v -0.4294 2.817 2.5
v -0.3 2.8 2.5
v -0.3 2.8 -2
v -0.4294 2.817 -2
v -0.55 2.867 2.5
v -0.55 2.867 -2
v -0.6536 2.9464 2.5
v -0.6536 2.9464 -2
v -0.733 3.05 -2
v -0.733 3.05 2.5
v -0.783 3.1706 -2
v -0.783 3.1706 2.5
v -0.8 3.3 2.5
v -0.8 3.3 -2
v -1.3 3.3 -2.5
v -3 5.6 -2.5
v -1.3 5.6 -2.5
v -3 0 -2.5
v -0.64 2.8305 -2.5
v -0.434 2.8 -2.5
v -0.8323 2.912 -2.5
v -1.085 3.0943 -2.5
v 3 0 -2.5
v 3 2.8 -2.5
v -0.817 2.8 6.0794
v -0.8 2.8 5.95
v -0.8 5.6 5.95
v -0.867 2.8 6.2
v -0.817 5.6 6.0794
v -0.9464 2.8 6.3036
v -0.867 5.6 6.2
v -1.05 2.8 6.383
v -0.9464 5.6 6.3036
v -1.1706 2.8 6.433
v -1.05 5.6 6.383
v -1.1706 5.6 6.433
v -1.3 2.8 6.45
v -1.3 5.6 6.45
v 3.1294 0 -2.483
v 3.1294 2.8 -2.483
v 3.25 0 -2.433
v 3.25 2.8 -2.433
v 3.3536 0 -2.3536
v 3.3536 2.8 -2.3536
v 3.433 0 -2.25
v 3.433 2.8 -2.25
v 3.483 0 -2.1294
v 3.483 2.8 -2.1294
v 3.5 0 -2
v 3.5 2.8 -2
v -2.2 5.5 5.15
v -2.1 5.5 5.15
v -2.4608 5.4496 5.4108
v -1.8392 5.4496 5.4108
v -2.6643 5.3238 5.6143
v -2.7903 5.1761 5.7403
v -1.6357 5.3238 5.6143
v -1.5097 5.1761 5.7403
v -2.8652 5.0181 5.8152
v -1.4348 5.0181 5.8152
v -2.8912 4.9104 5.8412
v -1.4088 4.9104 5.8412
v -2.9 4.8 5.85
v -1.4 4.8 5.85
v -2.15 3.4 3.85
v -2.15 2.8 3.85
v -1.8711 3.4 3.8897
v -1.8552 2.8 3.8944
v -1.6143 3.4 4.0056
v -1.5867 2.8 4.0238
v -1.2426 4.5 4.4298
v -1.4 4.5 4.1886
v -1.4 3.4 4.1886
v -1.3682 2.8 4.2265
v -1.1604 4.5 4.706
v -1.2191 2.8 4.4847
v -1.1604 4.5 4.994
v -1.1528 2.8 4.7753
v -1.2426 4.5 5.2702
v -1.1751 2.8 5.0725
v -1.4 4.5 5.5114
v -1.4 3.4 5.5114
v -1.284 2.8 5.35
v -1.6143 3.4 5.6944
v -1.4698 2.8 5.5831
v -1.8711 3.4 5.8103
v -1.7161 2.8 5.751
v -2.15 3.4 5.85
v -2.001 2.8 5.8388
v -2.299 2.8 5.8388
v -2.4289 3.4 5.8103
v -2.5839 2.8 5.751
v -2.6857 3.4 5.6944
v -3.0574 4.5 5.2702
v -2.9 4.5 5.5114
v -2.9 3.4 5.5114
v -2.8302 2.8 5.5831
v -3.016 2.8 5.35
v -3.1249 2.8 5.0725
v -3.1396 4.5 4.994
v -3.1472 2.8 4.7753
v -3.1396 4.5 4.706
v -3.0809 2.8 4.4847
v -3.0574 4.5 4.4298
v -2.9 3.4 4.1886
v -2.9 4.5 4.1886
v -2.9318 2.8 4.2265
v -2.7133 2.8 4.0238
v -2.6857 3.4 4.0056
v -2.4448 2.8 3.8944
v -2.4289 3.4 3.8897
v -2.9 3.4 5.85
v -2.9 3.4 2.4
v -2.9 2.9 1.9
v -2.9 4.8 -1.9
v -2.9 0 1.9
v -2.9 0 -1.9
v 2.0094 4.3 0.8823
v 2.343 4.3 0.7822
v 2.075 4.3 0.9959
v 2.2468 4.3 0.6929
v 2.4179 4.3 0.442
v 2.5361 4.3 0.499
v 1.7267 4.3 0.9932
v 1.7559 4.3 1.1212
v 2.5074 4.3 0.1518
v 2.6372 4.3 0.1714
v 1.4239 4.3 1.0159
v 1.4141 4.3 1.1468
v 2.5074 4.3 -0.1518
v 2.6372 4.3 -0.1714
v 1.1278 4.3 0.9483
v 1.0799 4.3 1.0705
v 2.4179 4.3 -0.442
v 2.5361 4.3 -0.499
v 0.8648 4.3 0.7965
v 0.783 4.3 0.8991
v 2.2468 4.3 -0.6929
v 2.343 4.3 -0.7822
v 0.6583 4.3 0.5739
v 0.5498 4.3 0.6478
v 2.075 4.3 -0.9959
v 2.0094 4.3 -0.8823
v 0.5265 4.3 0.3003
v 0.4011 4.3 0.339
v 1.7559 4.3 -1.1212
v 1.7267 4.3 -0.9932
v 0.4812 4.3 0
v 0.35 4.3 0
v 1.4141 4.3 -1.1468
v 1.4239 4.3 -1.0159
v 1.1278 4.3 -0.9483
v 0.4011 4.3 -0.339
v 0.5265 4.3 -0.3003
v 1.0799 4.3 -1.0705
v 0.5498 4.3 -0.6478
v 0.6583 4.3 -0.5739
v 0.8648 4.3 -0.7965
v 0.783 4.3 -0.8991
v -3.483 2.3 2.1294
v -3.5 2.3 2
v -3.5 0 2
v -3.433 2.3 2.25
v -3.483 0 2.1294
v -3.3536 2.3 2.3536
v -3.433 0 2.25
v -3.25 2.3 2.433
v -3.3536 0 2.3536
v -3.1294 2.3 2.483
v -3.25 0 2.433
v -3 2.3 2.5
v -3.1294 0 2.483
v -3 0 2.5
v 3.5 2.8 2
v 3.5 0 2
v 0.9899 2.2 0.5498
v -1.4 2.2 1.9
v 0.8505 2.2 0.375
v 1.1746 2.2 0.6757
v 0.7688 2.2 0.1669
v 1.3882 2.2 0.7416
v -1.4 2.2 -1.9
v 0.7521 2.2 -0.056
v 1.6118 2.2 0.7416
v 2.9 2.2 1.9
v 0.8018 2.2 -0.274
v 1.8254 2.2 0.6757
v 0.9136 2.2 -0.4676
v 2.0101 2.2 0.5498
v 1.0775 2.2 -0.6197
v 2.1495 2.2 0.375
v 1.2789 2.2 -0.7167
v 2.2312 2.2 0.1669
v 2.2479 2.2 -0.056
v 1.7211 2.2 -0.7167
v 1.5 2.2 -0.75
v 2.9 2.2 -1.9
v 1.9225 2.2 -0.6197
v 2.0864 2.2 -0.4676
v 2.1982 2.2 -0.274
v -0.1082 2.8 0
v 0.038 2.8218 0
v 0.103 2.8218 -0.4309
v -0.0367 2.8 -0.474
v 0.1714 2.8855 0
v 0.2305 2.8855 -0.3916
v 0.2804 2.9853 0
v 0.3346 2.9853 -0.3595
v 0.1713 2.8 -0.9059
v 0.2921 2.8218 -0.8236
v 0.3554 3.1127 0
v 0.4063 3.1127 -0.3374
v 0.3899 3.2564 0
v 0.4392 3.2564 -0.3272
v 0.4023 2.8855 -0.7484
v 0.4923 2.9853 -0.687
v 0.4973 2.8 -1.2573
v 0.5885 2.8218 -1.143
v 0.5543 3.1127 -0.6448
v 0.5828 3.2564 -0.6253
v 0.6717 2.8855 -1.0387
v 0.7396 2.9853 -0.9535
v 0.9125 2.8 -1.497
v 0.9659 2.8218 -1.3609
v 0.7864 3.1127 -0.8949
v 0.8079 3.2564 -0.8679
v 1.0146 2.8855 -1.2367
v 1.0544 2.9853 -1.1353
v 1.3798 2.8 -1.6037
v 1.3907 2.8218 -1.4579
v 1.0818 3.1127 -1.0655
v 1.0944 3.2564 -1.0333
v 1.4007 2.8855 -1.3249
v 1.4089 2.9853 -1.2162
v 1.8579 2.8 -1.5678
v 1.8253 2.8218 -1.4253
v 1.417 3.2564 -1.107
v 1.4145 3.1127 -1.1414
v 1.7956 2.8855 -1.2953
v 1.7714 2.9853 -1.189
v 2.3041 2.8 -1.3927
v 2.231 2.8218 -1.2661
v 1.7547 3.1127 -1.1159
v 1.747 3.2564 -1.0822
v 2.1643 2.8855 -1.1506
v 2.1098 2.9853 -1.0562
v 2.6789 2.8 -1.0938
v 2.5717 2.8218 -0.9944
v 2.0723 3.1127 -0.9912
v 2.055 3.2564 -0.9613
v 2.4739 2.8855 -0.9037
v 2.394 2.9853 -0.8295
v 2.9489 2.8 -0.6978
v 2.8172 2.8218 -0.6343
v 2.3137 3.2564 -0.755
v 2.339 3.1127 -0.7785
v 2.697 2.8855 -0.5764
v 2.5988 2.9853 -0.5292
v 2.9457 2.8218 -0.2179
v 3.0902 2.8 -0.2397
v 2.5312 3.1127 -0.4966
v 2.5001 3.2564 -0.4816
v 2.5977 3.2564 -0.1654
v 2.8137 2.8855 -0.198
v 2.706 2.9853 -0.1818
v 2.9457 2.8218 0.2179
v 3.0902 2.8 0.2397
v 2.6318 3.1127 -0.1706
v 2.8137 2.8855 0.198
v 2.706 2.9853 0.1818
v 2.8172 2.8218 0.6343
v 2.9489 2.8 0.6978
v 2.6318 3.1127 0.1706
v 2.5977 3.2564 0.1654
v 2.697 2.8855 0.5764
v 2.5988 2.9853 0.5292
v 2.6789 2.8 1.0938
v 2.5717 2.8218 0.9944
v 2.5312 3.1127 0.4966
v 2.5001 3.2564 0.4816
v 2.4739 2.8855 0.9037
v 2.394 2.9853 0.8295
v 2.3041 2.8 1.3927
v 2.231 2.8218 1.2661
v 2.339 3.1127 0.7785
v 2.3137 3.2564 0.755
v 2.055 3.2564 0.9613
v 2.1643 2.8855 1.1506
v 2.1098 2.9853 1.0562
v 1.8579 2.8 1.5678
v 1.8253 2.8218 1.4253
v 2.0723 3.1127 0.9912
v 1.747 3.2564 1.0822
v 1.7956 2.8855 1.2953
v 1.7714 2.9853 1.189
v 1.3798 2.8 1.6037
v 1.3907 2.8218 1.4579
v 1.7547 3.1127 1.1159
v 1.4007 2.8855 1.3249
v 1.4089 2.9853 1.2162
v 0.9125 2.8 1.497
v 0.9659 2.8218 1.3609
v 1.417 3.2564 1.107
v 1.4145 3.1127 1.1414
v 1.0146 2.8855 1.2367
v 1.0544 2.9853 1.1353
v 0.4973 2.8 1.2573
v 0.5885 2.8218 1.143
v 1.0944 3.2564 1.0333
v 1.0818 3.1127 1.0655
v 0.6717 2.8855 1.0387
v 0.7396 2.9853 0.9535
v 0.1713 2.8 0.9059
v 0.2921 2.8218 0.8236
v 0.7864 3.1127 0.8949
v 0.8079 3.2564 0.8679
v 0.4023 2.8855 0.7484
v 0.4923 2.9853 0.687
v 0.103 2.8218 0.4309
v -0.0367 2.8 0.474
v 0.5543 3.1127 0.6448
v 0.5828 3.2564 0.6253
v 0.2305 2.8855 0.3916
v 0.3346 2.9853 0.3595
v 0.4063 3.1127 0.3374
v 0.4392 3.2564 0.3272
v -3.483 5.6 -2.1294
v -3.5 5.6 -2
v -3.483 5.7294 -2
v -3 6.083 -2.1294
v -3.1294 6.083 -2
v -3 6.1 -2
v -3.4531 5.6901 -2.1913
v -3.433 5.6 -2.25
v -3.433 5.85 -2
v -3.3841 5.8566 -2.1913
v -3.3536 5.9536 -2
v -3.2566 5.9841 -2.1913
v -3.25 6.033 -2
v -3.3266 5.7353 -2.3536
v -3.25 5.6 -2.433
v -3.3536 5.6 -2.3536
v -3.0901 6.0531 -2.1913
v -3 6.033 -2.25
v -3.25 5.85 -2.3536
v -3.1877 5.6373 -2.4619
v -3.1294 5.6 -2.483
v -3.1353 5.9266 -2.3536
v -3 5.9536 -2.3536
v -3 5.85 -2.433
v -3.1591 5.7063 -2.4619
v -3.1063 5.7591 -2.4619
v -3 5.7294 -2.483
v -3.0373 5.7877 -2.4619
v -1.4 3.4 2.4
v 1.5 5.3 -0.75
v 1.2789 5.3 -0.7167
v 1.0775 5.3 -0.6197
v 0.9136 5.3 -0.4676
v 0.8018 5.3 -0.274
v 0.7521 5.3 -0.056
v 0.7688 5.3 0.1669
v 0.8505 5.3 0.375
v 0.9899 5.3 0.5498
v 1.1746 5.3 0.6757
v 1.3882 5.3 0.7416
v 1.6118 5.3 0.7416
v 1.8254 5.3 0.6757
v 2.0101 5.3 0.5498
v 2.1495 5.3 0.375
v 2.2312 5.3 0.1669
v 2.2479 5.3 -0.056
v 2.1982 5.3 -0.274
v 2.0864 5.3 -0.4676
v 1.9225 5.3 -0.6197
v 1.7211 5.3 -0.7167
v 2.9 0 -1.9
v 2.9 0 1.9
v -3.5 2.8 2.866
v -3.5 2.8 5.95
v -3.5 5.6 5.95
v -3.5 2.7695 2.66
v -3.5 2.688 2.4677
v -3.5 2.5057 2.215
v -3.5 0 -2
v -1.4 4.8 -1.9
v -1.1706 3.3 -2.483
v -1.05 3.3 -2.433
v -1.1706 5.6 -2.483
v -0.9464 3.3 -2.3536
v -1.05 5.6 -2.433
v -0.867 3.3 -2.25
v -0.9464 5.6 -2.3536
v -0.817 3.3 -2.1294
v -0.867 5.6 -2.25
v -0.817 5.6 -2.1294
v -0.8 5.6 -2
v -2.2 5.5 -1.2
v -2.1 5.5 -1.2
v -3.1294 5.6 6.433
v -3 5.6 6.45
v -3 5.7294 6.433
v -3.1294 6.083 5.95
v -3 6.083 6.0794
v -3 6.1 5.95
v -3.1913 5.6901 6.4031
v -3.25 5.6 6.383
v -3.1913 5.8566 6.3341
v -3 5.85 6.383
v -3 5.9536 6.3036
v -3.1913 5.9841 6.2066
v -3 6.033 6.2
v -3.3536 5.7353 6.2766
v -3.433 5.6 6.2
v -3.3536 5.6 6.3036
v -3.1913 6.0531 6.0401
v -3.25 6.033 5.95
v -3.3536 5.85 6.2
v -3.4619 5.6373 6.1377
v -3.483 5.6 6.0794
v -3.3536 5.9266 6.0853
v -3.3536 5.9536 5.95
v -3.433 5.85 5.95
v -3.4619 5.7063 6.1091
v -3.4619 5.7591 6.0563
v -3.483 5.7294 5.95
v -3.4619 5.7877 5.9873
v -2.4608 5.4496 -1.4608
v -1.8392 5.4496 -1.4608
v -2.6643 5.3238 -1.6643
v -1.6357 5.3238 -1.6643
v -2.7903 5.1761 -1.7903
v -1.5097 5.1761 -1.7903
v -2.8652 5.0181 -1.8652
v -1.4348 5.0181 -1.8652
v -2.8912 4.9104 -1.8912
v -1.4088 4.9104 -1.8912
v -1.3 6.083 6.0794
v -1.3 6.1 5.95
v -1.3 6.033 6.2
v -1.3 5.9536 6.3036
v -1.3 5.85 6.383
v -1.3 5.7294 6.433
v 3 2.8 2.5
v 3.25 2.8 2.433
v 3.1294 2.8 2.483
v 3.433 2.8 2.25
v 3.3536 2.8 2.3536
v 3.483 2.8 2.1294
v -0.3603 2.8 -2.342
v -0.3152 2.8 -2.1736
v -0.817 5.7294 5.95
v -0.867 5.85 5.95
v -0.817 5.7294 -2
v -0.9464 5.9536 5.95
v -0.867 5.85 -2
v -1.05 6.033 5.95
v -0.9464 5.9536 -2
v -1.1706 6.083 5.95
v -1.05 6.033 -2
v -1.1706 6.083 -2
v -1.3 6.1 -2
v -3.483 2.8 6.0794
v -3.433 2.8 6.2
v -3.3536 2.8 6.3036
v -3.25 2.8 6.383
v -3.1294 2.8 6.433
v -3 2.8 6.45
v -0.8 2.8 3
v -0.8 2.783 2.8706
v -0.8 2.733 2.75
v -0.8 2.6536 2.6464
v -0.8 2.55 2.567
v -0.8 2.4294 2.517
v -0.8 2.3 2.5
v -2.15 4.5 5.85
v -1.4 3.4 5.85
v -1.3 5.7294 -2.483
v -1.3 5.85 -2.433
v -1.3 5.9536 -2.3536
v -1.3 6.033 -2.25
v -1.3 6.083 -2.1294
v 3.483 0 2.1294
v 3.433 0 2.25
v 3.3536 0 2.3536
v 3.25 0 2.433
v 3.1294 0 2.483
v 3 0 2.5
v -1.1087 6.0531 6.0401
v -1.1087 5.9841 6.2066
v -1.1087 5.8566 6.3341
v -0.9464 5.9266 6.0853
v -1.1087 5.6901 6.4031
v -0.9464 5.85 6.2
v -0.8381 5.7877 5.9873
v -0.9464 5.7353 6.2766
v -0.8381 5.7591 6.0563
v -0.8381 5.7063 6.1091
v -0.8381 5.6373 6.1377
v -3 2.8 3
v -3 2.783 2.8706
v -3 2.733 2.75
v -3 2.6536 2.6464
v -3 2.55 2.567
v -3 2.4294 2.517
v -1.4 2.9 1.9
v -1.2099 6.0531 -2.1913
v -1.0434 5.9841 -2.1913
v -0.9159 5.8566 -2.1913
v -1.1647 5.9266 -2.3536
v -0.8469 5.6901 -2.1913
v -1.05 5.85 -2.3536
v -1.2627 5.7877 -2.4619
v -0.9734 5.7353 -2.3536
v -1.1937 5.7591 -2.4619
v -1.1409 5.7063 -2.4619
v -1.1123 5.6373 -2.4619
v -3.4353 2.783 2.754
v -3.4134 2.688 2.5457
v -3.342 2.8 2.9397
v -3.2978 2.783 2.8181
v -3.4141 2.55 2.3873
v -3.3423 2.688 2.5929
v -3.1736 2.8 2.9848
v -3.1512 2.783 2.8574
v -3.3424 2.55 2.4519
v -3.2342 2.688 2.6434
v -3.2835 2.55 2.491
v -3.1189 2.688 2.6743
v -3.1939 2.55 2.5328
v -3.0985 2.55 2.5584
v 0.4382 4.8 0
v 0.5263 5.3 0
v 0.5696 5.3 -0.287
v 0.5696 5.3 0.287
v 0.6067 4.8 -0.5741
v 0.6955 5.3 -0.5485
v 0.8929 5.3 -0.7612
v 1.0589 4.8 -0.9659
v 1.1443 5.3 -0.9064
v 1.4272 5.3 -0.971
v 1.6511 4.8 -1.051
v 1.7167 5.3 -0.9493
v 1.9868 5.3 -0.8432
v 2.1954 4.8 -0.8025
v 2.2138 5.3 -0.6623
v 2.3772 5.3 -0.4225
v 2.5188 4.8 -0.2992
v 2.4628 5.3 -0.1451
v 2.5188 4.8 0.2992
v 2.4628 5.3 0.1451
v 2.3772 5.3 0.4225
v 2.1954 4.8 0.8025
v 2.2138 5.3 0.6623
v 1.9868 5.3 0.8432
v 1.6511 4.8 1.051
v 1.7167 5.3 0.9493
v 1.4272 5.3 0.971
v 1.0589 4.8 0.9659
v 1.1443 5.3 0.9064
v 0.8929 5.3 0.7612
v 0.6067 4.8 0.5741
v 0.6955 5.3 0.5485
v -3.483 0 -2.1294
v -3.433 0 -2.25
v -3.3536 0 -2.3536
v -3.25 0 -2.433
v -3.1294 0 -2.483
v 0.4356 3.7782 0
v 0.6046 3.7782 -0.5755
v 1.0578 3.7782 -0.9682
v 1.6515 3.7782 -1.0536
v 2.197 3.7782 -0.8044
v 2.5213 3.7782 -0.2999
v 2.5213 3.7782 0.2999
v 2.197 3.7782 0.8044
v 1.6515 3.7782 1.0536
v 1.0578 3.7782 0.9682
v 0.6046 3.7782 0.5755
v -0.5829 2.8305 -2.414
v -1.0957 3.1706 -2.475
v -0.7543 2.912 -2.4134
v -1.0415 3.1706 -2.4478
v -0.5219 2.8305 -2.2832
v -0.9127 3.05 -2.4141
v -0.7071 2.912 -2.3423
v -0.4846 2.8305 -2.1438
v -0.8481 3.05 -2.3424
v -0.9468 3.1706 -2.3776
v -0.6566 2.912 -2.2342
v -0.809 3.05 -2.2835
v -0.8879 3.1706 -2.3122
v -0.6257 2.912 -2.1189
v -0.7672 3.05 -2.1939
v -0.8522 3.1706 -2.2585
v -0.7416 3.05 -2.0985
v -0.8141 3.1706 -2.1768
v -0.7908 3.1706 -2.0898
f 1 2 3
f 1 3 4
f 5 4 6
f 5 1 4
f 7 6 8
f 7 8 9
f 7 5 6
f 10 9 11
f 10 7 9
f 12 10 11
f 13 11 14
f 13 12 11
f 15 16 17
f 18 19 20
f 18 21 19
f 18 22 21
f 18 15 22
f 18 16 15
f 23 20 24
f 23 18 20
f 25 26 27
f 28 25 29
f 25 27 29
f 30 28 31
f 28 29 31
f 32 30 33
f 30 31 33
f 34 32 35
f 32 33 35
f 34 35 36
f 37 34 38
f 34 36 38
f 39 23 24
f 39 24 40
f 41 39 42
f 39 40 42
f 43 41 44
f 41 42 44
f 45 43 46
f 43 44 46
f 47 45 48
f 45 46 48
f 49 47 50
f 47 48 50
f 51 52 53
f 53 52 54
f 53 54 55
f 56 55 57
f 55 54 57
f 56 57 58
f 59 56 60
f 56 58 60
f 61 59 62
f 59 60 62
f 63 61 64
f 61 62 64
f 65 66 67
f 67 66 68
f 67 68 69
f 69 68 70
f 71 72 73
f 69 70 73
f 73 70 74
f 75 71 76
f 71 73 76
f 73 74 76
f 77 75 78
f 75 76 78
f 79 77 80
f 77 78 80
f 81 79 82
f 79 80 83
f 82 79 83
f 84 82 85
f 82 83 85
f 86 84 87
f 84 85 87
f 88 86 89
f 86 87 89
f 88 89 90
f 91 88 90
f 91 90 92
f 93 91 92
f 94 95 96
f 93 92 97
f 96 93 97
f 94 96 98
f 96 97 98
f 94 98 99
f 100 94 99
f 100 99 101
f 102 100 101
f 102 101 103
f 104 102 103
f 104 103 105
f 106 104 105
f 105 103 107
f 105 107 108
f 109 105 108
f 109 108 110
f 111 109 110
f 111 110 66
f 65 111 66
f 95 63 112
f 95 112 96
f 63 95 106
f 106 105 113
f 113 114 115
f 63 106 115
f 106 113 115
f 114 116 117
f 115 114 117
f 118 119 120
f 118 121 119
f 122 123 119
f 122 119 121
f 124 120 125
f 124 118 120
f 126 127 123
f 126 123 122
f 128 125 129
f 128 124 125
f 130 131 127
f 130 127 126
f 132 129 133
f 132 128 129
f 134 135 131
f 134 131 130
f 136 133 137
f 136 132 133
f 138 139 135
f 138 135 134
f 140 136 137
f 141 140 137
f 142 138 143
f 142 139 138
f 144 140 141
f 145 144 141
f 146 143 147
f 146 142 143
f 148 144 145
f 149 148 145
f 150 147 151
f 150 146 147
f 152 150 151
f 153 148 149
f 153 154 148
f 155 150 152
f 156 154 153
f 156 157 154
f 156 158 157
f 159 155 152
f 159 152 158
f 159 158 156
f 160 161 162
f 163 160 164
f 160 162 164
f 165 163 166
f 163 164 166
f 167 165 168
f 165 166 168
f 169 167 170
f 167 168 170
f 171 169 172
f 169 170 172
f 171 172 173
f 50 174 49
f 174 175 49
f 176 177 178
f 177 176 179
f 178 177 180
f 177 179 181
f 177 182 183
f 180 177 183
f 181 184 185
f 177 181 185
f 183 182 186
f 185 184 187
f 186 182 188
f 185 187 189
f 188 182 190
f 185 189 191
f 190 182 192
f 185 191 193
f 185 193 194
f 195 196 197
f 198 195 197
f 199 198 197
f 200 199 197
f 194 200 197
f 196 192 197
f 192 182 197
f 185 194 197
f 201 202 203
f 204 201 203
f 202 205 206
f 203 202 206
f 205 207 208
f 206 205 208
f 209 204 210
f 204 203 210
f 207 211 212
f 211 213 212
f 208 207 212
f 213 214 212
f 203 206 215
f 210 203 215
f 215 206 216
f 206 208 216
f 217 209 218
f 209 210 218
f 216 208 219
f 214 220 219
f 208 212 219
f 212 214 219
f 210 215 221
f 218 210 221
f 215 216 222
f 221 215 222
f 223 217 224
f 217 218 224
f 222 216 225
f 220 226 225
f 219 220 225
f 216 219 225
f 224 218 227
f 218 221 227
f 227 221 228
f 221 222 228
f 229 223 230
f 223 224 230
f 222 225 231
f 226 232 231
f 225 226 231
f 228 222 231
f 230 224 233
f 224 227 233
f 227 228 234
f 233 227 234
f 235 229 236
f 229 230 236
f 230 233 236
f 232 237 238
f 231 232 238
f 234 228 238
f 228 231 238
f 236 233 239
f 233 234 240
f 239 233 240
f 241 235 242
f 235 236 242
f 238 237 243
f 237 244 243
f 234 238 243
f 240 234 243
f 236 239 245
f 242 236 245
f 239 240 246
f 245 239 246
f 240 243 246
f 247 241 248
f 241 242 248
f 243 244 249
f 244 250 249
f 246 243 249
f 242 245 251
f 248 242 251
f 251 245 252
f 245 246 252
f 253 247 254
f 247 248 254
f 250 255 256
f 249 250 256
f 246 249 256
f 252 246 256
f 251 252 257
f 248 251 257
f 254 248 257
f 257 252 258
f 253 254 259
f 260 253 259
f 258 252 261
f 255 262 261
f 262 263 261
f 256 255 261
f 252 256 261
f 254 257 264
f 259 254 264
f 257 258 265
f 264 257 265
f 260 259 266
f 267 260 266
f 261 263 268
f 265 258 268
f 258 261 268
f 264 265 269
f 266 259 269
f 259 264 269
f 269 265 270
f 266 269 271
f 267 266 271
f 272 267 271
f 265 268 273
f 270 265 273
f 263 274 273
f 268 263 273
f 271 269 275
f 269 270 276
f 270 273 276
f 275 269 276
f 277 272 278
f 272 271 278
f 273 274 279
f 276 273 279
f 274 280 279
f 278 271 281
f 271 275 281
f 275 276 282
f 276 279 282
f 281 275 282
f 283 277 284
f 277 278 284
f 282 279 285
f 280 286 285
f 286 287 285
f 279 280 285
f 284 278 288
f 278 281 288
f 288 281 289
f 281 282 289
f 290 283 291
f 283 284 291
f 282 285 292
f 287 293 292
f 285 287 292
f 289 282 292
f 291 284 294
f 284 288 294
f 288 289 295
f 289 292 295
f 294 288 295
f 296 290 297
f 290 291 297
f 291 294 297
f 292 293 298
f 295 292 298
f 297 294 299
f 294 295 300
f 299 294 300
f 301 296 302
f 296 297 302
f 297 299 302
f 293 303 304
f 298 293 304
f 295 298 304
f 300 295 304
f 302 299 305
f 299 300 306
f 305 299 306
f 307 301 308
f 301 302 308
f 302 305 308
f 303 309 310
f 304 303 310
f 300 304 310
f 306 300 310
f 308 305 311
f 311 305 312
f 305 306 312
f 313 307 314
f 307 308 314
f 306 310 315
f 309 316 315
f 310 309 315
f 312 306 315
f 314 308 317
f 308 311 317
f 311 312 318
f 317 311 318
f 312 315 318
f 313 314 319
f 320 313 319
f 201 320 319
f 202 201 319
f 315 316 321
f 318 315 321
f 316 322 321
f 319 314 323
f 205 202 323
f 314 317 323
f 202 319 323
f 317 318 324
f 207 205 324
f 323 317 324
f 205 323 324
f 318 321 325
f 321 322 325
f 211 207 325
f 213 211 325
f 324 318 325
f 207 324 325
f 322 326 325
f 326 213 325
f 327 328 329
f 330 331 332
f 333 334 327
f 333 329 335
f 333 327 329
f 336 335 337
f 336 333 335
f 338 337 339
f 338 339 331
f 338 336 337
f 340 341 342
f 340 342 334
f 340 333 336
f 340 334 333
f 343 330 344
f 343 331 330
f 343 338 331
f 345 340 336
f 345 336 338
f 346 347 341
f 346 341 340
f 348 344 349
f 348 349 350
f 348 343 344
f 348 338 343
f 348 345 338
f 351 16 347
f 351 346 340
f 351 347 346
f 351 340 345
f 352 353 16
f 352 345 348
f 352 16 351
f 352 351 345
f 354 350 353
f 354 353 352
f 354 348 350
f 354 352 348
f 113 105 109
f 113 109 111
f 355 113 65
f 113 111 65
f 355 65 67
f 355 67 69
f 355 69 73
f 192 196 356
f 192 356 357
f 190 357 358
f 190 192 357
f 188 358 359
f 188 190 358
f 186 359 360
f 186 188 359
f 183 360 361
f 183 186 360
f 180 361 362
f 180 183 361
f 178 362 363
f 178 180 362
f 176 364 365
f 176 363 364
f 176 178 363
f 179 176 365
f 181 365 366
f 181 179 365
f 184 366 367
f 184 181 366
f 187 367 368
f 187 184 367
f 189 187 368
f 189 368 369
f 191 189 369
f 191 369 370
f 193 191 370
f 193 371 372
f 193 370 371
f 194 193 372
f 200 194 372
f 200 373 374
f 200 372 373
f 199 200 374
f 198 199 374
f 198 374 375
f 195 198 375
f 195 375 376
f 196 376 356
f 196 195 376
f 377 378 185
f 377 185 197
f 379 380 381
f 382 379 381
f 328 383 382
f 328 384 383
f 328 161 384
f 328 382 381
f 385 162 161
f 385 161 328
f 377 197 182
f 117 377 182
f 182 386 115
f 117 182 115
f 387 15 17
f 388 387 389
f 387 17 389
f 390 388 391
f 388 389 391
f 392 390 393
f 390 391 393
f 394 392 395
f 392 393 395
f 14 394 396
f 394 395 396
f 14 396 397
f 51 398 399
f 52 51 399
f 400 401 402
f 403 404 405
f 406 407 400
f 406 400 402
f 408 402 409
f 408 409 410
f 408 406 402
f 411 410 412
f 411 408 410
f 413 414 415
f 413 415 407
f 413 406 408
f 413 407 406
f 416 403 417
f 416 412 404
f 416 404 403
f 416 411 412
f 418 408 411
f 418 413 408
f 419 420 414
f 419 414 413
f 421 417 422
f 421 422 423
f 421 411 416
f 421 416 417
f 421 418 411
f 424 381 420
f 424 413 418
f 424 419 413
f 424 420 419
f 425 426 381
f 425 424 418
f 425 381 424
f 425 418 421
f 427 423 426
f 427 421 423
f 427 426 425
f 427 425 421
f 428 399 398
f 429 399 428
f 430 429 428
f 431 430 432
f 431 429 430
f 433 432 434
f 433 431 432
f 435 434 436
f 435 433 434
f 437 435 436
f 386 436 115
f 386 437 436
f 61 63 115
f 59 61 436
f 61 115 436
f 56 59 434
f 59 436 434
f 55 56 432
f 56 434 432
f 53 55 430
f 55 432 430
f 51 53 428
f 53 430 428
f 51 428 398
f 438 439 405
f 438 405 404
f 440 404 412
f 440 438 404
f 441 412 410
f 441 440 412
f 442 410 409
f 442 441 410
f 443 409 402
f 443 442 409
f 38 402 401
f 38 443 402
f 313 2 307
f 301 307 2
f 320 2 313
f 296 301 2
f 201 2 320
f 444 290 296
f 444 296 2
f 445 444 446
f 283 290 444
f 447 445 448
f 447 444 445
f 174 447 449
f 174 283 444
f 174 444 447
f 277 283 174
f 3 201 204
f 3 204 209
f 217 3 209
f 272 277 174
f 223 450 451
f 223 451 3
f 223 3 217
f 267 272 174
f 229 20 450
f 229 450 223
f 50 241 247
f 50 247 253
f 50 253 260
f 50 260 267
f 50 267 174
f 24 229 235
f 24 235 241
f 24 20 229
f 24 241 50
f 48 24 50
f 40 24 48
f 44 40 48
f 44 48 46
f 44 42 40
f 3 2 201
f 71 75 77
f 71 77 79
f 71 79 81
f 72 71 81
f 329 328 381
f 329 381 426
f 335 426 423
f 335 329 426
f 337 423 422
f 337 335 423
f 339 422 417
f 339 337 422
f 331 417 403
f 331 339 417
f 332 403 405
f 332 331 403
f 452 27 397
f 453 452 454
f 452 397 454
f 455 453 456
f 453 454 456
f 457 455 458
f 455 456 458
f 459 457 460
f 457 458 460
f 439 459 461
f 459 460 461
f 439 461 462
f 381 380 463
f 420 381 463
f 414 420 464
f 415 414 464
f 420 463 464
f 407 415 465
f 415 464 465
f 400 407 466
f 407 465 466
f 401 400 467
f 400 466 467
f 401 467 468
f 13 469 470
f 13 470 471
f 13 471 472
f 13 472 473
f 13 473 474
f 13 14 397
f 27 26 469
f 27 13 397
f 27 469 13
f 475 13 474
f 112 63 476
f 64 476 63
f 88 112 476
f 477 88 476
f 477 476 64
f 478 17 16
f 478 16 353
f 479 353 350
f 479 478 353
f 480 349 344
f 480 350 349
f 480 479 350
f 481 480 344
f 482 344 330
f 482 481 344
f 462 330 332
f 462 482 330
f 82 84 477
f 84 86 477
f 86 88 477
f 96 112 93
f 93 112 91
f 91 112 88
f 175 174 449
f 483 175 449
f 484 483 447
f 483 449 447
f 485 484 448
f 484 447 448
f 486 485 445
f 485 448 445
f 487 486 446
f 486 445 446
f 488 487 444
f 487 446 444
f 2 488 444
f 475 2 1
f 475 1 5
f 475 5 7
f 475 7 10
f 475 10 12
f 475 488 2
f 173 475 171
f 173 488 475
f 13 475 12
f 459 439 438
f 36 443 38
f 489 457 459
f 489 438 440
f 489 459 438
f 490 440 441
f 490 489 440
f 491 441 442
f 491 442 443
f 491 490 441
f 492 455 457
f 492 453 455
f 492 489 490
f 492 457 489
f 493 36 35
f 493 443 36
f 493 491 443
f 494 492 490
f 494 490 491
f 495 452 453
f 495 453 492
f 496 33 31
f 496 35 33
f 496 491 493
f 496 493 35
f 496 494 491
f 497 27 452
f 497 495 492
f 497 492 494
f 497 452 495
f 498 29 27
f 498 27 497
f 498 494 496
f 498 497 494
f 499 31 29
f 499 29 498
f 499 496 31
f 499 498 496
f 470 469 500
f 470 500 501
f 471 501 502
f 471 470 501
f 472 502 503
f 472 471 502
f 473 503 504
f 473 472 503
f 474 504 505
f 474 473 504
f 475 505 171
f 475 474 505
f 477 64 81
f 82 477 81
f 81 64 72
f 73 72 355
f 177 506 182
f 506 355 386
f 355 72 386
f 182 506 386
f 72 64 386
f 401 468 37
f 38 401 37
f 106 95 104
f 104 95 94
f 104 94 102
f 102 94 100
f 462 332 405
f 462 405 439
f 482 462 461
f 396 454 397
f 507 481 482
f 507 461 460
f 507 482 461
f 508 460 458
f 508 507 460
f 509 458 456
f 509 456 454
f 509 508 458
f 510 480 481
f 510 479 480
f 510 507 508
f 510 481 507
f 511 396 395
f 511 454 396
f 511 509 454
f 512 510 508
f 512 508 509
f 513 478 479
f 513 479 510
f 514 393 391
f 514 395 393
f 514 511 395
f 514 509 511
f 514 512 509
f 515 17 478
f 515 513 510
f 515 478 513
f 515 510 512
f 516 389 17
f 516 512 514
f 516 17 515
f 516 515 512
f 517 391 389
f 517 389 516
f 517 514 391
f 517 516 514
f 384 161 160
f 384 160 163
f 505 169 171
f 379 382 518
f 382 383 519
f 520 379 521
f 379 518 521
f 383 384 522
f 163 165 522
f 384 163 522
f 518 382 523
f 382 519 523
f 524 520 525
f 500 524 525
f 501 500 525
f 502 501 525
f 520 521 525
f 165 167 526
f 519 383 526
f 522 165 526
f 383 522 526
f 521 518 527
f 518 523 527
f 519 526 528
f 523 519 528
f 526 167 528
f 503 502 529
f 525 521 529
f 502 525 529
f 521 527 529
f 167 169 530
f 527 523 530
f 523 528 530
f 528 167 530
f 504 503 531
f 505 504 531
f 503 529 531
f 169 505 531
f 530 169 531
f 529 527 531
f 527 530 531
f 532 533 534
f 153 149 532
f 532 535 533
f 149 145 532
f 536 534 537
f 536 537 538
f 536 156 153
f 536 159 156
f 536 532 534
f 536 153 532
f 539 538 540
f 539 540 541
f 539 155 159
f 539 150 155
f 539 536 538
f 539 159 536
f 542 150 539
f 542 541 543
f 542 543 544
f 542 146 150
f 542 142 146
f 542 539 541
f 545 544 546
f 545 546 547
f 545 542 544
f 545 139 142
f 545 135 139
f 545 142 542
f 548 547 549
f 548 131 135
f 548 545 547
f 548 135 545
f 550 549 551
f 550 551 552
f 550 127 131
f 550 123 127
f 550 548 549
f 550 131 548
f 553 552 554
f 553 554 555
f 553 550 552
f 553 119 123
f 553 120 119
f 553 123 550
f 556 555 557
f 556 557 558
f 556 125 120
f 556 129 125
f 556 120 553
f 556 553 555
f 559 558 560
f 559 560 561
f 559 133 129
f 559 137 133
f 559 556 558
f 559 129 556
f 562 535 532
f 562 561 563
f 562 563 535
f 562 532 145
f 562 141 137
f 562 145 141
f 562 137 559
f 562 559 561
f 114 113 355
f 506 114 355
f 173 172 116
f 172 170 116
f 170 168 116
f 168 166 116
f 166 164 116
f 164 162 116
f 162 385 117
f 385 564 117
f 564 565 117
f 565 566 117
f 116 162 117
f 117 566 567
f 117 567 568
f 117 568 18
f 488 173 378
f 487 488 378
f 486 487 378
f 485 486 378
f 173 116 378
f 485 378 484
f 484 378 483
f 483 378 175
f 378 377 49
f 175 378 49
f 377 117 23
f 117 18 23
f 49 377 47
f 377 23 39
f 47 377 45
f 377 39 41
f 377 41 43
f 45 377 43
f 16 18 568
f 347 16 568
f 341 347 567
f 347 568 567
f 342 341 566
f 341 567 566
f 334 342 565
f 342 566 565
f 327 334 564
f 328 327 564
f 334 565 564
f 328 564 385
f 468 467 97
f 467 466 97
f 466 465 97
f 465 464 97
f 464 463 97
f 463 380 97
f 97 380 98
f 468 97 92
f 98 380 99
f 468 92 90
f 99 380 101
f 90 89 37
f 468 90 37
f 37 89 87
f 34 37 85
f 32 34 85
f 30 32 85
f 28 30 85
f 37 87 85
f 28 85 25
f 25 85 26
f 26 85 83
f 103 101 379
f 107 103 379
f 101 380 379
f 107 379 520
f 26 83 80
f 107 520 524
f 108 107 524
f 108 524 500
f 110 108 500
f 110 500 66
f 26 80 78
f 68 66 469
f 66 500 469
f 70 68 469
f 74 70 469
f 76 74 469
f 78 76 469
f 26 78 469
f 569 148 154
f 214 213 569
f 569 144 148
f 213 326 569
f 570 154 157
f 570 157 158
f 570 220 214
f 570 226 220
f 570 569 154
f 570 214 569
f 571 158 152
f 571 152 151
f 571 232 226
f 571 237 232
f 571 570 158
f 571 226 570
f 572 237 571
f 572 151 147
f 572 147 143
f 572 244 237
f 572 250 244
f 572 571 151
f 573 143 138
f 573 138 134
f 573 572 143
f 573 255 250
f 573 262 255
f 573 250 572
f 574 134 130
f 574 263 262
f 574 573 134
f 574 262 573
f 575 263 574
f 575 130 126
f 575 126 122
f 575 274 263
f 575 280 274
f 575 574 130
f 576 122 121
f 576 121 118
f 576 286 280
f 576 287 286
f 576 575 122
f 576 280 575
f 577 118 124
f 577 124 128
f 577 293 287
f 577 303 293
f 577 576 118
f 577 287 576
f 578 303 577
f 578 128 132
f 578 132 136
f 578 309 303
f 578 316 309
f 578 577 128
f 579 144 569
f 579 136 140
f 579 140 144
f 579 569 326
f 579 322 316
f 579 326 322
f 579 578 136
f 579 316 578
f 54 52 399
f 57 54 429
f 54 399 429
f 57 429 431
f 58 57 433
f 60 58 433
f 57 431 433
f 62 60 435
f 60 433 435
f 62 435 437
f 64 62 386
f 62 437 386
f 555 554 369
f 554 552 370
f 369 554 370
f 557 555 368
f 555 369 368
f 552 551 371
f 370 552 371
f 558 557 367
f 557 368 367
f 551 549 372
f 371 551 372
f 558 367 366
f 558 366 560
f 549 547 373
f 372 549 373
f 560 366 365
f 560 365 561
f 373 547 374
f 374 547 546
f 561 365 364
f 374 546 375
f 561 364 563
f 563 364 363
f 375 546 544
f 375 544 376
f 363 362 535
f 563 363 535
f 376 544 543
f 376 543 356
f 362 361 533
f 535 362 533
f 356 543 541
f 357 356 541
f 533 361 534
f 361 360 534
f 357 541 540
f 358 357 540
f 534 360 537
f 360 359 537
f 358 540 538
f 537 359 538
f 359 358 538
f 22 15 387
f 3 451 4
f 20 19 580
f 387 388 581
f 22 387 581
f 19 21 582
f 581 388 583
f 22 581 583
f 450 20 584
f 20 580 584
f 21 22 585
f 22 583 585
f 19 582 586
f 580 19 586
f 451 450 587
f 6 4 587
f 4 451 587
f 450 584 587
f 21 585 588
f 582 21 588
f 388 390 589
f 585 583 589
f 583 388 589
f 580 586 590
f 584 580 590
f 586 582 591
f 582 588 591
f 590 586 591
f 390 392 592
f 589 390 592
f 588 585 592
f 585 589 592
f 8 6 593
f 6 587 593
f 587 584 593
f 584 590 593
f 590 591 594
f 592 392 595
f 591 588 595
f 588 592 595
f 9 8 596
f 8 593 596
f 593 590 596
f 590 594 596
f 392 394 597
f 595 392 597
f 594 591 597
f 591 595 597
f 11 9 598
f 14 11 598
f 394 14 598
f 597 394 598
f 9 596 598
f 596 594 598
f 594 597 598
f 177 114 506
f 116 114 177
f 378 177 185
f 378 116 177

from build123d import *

# Parameters (mm, degrees)
SKETCH1_W               = 7
SKETCH1_H               = 5
SKETCH1_W_2             = 5.8
SKETCH1_H_2             = 3.8
BOSS_EXTRUDE1_DEPTH     = 2.8
SKETCH3_W               = 2.7
SKETCH3_H               = 8.95
SKETCH3_W_2             = 1.5
SKETCH3_H_2             = 7.75
BOSS_EXTRUDE2_DEPTH     = 2.7
SKETCH4_W               = 2.7
SKETCH4_H               = 4.55
BOSS_EXTRUDE3_DEPTH     = 0.6
SKETCH5_W               = 2.7
SKETCH5_H               = 8.95
BOSS_EXTRUDE4_DEPTH     = 0.6
SKETCH6_W               = 4.9
SKETCH6_H               = 5
BOSS_EXTRUDE5_DEPTH     = 0.6
FILLET2_R               = 0.7
SKETCH7_R               = 1
CUT_EXTRUDE1_DEPTH      = 1.7
SKETCH8_R               = 1.15
BOSS_EXTRUDE6_DEPTH     = 1.5
BOSS_EXTRUDE6_DRAFT     = -5
FILLET1_R               = 0.5
BOSS_EXTRUDE7_START     = -1.5
SKETCH8_2_R             = 1.15
BOSS_EXTRUDE7_DEPTH     = 1
BOSS_EXTRUDE7_DRAFT     = -10
CUT_EXTRUDE2_DEPTH      = 10.052209675
CUT_EXTRUDE2_DEPTH_BACK = 10.052209675
SKETCH9_R               = 0.75
FILLET3_R               = 0.5
FILLET5_R               = 0.5
FILLET6_R               = 0.5
FILLET7_R               = 0.5
CHAMFER1_SIZE           = 0.5


with BuildPart() as part:
    # Sketch1 → Boss-Extrude1 (new body)
    with BuildSketch(Plane(origin=(0, 0, 0), x_dir=(1, 0, 0), z_dir=(0, 1, 0))):
        Rectangle(SKETCH1_W, SKETCH1_H)
        Rectangle(SKETCH1_W_2, SKETCH1_H_2, mode=Mode.SUBTRACT)
    extrude(amount=BOSS_EXTRUDE1_DEPTH)

    # Sketch3 → Boss-Extrude2 (add)
    with BuildSketch(Plane(origin=(0, 2.8, 0), x_dir=(1, 0, 0), z_dir=(0, 1, 0))):
        with Locations((-2.15, -1.975)):
            Rectangle(SKETCH3_W, SKETCH3_H)
        with Locations((-2.15, -1.975)):
            Rectangle(SKETCH3_W_2, SKETCH3_H_2, mode=Mode.SUBTRACT)
    extrude(amount=BOSS_EXTRUDE2_DEPTH)

    # Sketch4 → Boss-Extrude3 (add)
    with BuildSketch(Plane.XZ.offset(-2.8)):
        with Locations((-2.15, 4.175)):
            Rectangle(SKETCH4_W, SKETCH4_H)
    extrude(amount=-BOSS_EXTRUDE3_DEPTH)

    # Sketch5 → Boss-Extrude4 (add)
    with BuildSketch(Plane(origin=(0, 5.5, 0), x_dir=(1, 0, 0), z_dir=(0, 1, 0))):
        with Locations((-2.15, -1.975)):
            Rectangle(SKETCH5_W, SKETCH5_H)
    extrude(amount=BOSS_EXTRUDE4_DEPTH)

    # Sketch6 → Boss-Extrude5 (add)
    with BuildSketch(Plane(origin=(0, 2.8, 0), x_dir=(1, 0, 0), z_dir=(0, 1, 0))):
        with Locations((1.05, 0)):
            Rectangle(SKETCH6_W, SKETCH6_H)
    extrude(amount=-BOSS_EXTRUDE5_DEPTH)

    # Fillet2
    fillet2_edges = [part.edges().sort_by_distance(p)[0] for p in [
        (-2.15, 5.5, -1.9),
        (-1.4, 5.5, 1.975),
        (-2.15, 5.5, 5.85),
        (-2.9, 5.5, 1.975),
    ]]
    fillet(fillet2_edges, radius=FILLET2_R)

    # Sketch7 → Cut-Extrude1 (cut)
    with BuildSketch(Plane.XZ.offset(-2.8)):
        with Locations(Location((-2.15, 4.85, 0), (0, 0, 270))):
            Circle(SKETCH7_R)
    extrude(amount=-CUT_EXTRUDE1_DEPTH, mode=Mode.SUBTRACT)


with BuildPart() as boss_extrude6_tool:
    # Sketch8 → Boss-Extrude6 (with draft: the straight prism first)
    with BuildSketch(Plane(origin=(0, 2.8, 0), x_dir=(-1, 0, 0), z_dir=(0, -1, 0))):
        with Locations((-1.5, 0)):
            Circle(SKETCH8_R)
    extrude(amount=-BOSS_EXTRUDE6_DEPTH)
    # Boss-Extrude6: the draft: its side faces are tilted about the plane it starts from
    boss_extrude6_sides = [boss_extrude6_tool.faces().sort_by_distance(p)[0] for p in [
        (2.65, 3.55, 0),
    ]]
    draft(boss_extrude6_sides, Plane(origin=(0, 2.8, 0), x_dir=(-1, 0, 0), z_dir=(0, -1, 0)), BOSS_EXTRUDE6_DRAFT)


with BuildPart() as part_1:
    add(part.part)

    # Boss-Extrude6: add boss_extrude6_tool
    add(boss_extrude6_tool.part)

    # Fillet1
    fillet1_edges = [part_1.edges().sort_by_distance(p)[0] for p in [
        (2.65, 2.8, 0),
    ]]
    fillet(fillet1_edges, radius=FILLET1_R)


with BuildPart() as boss_extrude7_tool:
    # Sketch8<2> → Boss-Extrude7 (with draft: the straight prism first)
    with BuildSketch(Plane(origin=(0, 2.8, 0), x_dir=(-1, 0, 0), z_dir=(0, -1, 0)).offset(BOSS_EXTRUDE7_START)):
        with Locations((-1.5, 0)):
            Circle(SKETCH8_2_R)
    extrude(amount=-BOSS_EXTRUDE7_DEPTH)
    # Boss-Extrude7: the draft: its side faces are tilted about the plane it starts from
    boss_extrude7_sides = [boss_extrude7_tool.faces().sort_by_distance(p)[0] for p in [
        (2.65, 4.8, 0),
    ]]
    draft(boss_extrude7_sides, Plane(origin=(0, 2.8, 0), x_dir=(-1, 0, 0), z_dir=(0, -1, 0)).offset(BOSS_EXTRUDE7_START), BOSS_EXTRUDE7_DRAFT)


with BuildPart() as part_2:
    add(part_1.part)

    # Boss-Extrude7: add boss_extrude7_tool
    add(boss_extrude7_tool.part)

    # Sketch9 → Cut-Extrude2 (cut, two sides: drawn at the far end of the back side and taken through both)
    with BuildSketch(Plane(origin=(0, 5.3, 0), x_dir=(1, 0, 0), z_dir=(0, 1, 0)).offset(-CUT_EXTRUDE2_DEPTH_BACK)):
        with Locations(Location((1.5, 0, 0), (0, 0, 90))):
            Circle(SKETCH9_R)
    extrude(amount=CUT_EXTRUDE2_DEPTH + CUT_EXTRUDE2_DEPTH_BACK, mode=Mode.SUBTRACT)

    # Fillet3
    fillet3_edges = [part_2.edges().sort_by_distance(p)[0] for p in [
        (-3.5, 6.1, 1.975),
        (-2.15, 6.1, 6.45),
        (-0.8, 6.1, 1.975),
        (-2.15, 6.1, -2.5),
    ]]
    fillet(fillet3_edges, radius=FILLET3_R)

    # Fillet5
    # the kernel refuses this fillet: 0.5 mm, written as the material it takes off along each edge
    with BuildSketch(Plane(origin=(-1.3, 5.6, -2), x_dir=(1, 0, 0), z_dir=(0, 0, -1))) as fillet5_piece_1_section:
        Polygon((0, 0), (FILLET5_R, 0), (FILLET5_R, -FILLET5_R), (0, -FILLET5_R), align=None)
    fillet5_piece_1 = extrude(amount=FILLET5_R, mode=Mode.PRIVATE)
    fillet5_piece_1 = fillet5_piece_1 - Plane(origin=(-1.3, 5.6, -2), x_dir=(-0.7071067811865475, -0.7071067811865475, 0), z_dir=(0, 0, -1)) * Sphere(FILLET5_R, mode=Mode.PRIVATE)
    add(fillet5_piece_1, mode=Mode.SUBTRACT)
    with BuildSketch(Plane(origin=(-1.3, 5.6, 5.95), x_dir=(0, 0, 1), z_dir=(1, 0, 0))) as fillet5_piece_2_section:
        Polygon((0, 0), (FILLET5_R, 0), (FILLET5_R, -FILLET5_R), (0, -FILLET5_R), align=None)
    fillet5_piece_2 = extrude(amount=FILLET5_R, mode=Mode.PRIVATE)
    fillet5_piece_2 = fillet5_piece_2 - Plane(origin=(-1.3, 5.6, 5.95), x_dir=(0, -0.7071067811865475, -0.7071067811865475), z_dir=(1, 0, 0)) * Sphere(FILLET5_R, mode=Mode.PRIVATE)
    add(fillet5_piece_2, mode=Mode.SUBTRACT)
    with BuildSketch(Plane(origin=(-3, 5.6, -2), x_dir=(-1, 0, 0), z_dir=(0, 0, -1))) as fillet5_piece_3_section:
        Polygon((0, 0), (FILLET5_R, 0), (FILLET5_R, FILLET5_R), (0, FILLET5_R), align=None)
    fillet5_piece_3 = extrude(amount=FILLET5_R, mode=Mode.PRIVATE)
    fillet5_piece_3 = fillet5_piece_3 - Plane(origin=(-3, 5.6, -2), x_dir=(0.7071067811865475, -0.7071067811865475, 0), z_dir=(0, 0, -1)) * Sphere(FILLET5_R, mode=Mode.PRIVATE)
    add(fillet5_piece_3, mode=Mode.SUBTRACT)
    with BuildSketch(Plane(origin=(-3, 5.6, 5.95), x_dir=(0, 0, 1), z_dir=(-1, 0, 0))) as fillet5_piece_4_section:
        Polygon((0, 0), (FILLET5_R, 0), (FILLET5_R, FILLET5_R), (0, FILLET5_R), align=None)
    fillet5_piece_4 = extrude(amount=FILLET5_R, mode=Mode.PRIVATE)
    fillet5_piece_4 = fillet5_piece_4 - Plane(origin=(-3, 5.6, 5.95), x_dir=(0, -0.7071067811865475, -0.7071067811865475), z_dir=(-1, 0, 0)) * Sphere(FILLET5_R, mode=Mode.PRIVATE)
    add(fillet5_piece_4, mode=Mode.SUBTRACT)
    with BuildSketch(Plane(origin=(-3.5, 1.55, 6.45), x_dir=(0, 0, -1), z_dir=(0, 1, 0)), Plane(origin=(-0.8, 5.6, 6.45), x_dir=(0, 0, -1), z_dir=(0, -1, 0)), Plane(origin=(-3.5, -1.25, 2.5), x_dir=(0, 0, -1), z_dir=(0, 1, 0))) as fillet5_piece_5:
        with BuildLine():
            CenterArc((FILLET5_R, -FILLET5_R), FILLET5_R, 90, 90)
            Line((0, -FILLET5_R), (0, 0))
            Line((0, 0), (FILLET5_R, 0))
        make_face()
    extrude(amount=4.05, mode=Mode.SUBTRACT)
    with BuildSketch(Plane(origin=(-3.5, -1.25, -2.5), x_dir=(1, 0, 0), z_dir=(0, 1, 0))) as fillet5_piece_6:
        with BuildLine():
            CenterArc((FILLET5_R, -FILLET5_R), FILLET5_R, 90, 90)
            Line((0, -FILLET5_R), (0, 0))
            Line((0, 0), (FILLET5_R, 0))
        make_face()
    extrude(amount=6.85, mode=Mode.SUBTRACT)
    with BuildSketch(Plane(origin=(-0.8, 5.6, -2.5), x_dir=(-1, 0, 0), z_dir=(0, -1, 0))) as fillet5_piece_7:
        with BuildLine():
            CenterArc((FILLET5_R, -FILLET5_R), FILLET5_R, 90, 90)
            Line((0, -FILLET5_R), (0, 0))
            Line((0, 0), (FILLET5_R, 0))
        make_face()
    extrude(amount=2.8, mode=Mode.SUBTRACT)
    with BuildSketch(Plane(origin=(3.5, 4.05, -2.5), x_dir=(-1, 0, 0), z_dir=(0, -1, 0)), Plane(origin=(3.5, 4.05, 2.5), x_dir=(0, 0, -1), z_dir=(0, -1, 0))) as fillet5_piece_8:
        with BuildLine():
            CenterArc((FILLET5_R, -FILLET5_R), FILLET5_R, 90, 90)
            Line((0, -FILLET5_R), (0, 0))
            Line((0, 0), (FILLET5_R, 0))
        make_face()
    extrude(amount=5.3, mode=Mode.SUBTRACT)

    # Fillet6
    # the kernel refuses this fillet: 0.5 mm, written as the material it adds along each edge
    with BuildSketch(Plane(origin=(-1.3, 2.8, -2), x_dir=(-0.5976672776328278, 0, 0.8017442392976482), z_dir=(0.8017442392976482, 0, 0.5976672776328278))) as fillet6_piece_1_section:
        with BuildLine():
            CenterArc((0.5 + FILLET6_R, -FILLET6_R), FILLET6_R, 90, 90)
            Line((0.5, -FILLET6_R), (0.5, 0))
            Line((0.5, 0), (0.5 + FILLET6_R, 0))
        make_face()
    fillet6_piece_1 = revolve(axis=Axis((-1.3, 2.8, -2), (0, -1, 0)), revolution_arc=233.296989237, mode=Mode.PRIVATE)
    fillet6_piece_1 = split(fillet6_piece_1, bisect_by=Plane(origin=(-0.925030534, 2.955814156, -2.5), z_dir=(0, 0, 1)), keep=Keep.TOP, mode=Mode.PRIVATE)
    fillet6_piece_1 = split(fillet6_piece_1, bisect_by=Plane(origin=(-0.925030534, 2.955814156, -1.9), z_dir=(0, 0, -1)), keep=Keep.TOP, mode=Mode.PRIVATE)
    add(fillet6_piece_1)
    with BuildSketch(Plane(origin=(-0.8, 2.8, 2.5), x_dir=(1, 0, 0), z_dir=(0, 0, -1))) as fillet6_piece_2:
        with BuildLine():
            CenterArc((FILLET6_R, -FILLET6_R), FILLET6_R, 90, 90)
            Line((0, -FILLET6_R), (0, 0))
            Line((0, 0), (FILLET6_R, 0))
        make_face()
    extrude(amount=4.5)

    # Fillet7
    # the kernel refuses this fillet: 0.5 mm, written as the material it adds along each edge
    with BuildSketch(Plane(origin=(-0.8, 2.8, 2.5), x_dir=(0, -1, 0), z_dir=(-1, 0, 0))) as fillet7_piece_1:
        with BuildLine():
            CenterArc((FILLET7_R, FILLET7_R), FILLET7_R, 180, 90)
            Line((0, FILLET7_R), (0, 0))
            Line((0, 0), (FILLET7_R, 0))
        make_face()
    extrude(amount=2.2)
    with BuildSketch(Plane(origin=(-3, 2.8, 2), x_dir=(0.8017442392976479, 0, -0.597667277632828), z_dir=(0.597667277632828, 0, 0.8017442392976479))) as fillet7_piece_2_section:
        with BuildLine():
            CenterArc((0.5 + FILLET7_R, -FILLET7_R), FILLET7_R, 90, 90)
            Line((0.5, -FILLET7_R), (0.5, 0))
            Line((0.5, 0), (0.5 + FILLET7_R, 0))
        make_face()
    fillet7_piece_2 = revolve(axis=Axis((-3, 2.8, 2), (0, 1, 0)), revolution_arc=233.296989237, mode=Mode.PRIVATE)
    fillet7_piece_2 = split(fillet7_piece_2, bisect_by=Plane(origin=(-3.5, 2.644185551, 2.37496936), z_dir=(1, 0, 0)), keep=Keep.TOP, mode=Mode.PRIVATE)
    fillet7_piece_2 = split(fillet7_piece_2, bisect_by=Plane(origin=(-2.9, 2.644185551, 2.37496936), z_dir=(-1, 0, 0)), keep=Keep.TOP, mode=Mode.PRIVATE)
    add(fillet7_piece_2)

    # Chamfer1
    chamfer1_edges = [part_2.edges().sort_by_distance(p)[0] for p in [
        (-2.15, 3.4, 1.9),
    ]]
    chamfer(chamfer1_edges, length=CHAMFER1_SIZE)


solid = part_2.part
